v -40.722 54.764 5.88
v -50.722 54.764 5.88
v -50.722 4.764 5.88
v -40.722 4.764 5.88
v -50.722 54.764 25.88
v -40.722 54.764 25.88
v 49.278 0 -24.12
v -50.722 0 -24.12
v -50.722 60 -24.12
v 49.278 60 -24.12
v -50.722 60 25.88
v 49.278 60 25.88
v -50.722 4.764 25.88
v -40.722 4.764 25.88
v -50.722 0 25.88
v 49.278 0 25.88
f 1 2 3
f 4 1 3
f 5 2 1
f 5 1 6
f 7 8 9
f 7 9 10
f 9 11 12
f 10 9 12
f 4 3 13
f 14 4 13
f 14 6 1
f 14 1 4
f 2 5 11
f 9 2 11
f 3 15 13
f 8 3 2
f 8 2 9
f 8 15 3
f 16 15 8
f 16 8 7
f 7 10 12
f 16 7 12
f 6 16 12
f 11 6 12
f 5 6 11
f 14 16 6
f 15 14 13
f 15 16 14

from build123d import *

# Parameters (mm, degrees)
F0_W     = 20
F0_H     = 20
F0_W_2   = 40
F0_H_2   = 30
F1_DEPTH = 60
F3_W     = 50
F3_H     = 20
F4_DEPTH = 10


with BuildPart() as f1:
    # F0 (on Front) → F1 (new body)
    with BuildSketch(Plane.XZ):
        Polygon((49.277523, 25.879864), (-50.722477, 25.879864), (-50.722477, -4.120136), (-30.722477, -4.120136), (-30.722477, -24.120136), (9.277523, -24.120136), (9.277523, 5.879864), (49.277523, 5.879864), align=None)
        with Locations((-40.722477, -14.120136)):
            Rectangle(F0_W, F0_H)
        with Locations((29.277523, -9.120136)):
            Rectangle(F0_W_2, F0_H_2)
    extrude(amount=-F1_DEPTH)

    # F3 (on face) → F4 (cut)
    with BuildSketch(Plane(origin=(-50.722477, 0, 0), x_dir=(0, -1, 0), z_dir=(-1, 0, 0))):
        with Locations((-29.763764, 15.879864)):
            Rectangle(F3_W, F3_H)
    extrude(amount=-F4_DEPTH, mode=Mode.SUBTRACT)


solid = f1.part
